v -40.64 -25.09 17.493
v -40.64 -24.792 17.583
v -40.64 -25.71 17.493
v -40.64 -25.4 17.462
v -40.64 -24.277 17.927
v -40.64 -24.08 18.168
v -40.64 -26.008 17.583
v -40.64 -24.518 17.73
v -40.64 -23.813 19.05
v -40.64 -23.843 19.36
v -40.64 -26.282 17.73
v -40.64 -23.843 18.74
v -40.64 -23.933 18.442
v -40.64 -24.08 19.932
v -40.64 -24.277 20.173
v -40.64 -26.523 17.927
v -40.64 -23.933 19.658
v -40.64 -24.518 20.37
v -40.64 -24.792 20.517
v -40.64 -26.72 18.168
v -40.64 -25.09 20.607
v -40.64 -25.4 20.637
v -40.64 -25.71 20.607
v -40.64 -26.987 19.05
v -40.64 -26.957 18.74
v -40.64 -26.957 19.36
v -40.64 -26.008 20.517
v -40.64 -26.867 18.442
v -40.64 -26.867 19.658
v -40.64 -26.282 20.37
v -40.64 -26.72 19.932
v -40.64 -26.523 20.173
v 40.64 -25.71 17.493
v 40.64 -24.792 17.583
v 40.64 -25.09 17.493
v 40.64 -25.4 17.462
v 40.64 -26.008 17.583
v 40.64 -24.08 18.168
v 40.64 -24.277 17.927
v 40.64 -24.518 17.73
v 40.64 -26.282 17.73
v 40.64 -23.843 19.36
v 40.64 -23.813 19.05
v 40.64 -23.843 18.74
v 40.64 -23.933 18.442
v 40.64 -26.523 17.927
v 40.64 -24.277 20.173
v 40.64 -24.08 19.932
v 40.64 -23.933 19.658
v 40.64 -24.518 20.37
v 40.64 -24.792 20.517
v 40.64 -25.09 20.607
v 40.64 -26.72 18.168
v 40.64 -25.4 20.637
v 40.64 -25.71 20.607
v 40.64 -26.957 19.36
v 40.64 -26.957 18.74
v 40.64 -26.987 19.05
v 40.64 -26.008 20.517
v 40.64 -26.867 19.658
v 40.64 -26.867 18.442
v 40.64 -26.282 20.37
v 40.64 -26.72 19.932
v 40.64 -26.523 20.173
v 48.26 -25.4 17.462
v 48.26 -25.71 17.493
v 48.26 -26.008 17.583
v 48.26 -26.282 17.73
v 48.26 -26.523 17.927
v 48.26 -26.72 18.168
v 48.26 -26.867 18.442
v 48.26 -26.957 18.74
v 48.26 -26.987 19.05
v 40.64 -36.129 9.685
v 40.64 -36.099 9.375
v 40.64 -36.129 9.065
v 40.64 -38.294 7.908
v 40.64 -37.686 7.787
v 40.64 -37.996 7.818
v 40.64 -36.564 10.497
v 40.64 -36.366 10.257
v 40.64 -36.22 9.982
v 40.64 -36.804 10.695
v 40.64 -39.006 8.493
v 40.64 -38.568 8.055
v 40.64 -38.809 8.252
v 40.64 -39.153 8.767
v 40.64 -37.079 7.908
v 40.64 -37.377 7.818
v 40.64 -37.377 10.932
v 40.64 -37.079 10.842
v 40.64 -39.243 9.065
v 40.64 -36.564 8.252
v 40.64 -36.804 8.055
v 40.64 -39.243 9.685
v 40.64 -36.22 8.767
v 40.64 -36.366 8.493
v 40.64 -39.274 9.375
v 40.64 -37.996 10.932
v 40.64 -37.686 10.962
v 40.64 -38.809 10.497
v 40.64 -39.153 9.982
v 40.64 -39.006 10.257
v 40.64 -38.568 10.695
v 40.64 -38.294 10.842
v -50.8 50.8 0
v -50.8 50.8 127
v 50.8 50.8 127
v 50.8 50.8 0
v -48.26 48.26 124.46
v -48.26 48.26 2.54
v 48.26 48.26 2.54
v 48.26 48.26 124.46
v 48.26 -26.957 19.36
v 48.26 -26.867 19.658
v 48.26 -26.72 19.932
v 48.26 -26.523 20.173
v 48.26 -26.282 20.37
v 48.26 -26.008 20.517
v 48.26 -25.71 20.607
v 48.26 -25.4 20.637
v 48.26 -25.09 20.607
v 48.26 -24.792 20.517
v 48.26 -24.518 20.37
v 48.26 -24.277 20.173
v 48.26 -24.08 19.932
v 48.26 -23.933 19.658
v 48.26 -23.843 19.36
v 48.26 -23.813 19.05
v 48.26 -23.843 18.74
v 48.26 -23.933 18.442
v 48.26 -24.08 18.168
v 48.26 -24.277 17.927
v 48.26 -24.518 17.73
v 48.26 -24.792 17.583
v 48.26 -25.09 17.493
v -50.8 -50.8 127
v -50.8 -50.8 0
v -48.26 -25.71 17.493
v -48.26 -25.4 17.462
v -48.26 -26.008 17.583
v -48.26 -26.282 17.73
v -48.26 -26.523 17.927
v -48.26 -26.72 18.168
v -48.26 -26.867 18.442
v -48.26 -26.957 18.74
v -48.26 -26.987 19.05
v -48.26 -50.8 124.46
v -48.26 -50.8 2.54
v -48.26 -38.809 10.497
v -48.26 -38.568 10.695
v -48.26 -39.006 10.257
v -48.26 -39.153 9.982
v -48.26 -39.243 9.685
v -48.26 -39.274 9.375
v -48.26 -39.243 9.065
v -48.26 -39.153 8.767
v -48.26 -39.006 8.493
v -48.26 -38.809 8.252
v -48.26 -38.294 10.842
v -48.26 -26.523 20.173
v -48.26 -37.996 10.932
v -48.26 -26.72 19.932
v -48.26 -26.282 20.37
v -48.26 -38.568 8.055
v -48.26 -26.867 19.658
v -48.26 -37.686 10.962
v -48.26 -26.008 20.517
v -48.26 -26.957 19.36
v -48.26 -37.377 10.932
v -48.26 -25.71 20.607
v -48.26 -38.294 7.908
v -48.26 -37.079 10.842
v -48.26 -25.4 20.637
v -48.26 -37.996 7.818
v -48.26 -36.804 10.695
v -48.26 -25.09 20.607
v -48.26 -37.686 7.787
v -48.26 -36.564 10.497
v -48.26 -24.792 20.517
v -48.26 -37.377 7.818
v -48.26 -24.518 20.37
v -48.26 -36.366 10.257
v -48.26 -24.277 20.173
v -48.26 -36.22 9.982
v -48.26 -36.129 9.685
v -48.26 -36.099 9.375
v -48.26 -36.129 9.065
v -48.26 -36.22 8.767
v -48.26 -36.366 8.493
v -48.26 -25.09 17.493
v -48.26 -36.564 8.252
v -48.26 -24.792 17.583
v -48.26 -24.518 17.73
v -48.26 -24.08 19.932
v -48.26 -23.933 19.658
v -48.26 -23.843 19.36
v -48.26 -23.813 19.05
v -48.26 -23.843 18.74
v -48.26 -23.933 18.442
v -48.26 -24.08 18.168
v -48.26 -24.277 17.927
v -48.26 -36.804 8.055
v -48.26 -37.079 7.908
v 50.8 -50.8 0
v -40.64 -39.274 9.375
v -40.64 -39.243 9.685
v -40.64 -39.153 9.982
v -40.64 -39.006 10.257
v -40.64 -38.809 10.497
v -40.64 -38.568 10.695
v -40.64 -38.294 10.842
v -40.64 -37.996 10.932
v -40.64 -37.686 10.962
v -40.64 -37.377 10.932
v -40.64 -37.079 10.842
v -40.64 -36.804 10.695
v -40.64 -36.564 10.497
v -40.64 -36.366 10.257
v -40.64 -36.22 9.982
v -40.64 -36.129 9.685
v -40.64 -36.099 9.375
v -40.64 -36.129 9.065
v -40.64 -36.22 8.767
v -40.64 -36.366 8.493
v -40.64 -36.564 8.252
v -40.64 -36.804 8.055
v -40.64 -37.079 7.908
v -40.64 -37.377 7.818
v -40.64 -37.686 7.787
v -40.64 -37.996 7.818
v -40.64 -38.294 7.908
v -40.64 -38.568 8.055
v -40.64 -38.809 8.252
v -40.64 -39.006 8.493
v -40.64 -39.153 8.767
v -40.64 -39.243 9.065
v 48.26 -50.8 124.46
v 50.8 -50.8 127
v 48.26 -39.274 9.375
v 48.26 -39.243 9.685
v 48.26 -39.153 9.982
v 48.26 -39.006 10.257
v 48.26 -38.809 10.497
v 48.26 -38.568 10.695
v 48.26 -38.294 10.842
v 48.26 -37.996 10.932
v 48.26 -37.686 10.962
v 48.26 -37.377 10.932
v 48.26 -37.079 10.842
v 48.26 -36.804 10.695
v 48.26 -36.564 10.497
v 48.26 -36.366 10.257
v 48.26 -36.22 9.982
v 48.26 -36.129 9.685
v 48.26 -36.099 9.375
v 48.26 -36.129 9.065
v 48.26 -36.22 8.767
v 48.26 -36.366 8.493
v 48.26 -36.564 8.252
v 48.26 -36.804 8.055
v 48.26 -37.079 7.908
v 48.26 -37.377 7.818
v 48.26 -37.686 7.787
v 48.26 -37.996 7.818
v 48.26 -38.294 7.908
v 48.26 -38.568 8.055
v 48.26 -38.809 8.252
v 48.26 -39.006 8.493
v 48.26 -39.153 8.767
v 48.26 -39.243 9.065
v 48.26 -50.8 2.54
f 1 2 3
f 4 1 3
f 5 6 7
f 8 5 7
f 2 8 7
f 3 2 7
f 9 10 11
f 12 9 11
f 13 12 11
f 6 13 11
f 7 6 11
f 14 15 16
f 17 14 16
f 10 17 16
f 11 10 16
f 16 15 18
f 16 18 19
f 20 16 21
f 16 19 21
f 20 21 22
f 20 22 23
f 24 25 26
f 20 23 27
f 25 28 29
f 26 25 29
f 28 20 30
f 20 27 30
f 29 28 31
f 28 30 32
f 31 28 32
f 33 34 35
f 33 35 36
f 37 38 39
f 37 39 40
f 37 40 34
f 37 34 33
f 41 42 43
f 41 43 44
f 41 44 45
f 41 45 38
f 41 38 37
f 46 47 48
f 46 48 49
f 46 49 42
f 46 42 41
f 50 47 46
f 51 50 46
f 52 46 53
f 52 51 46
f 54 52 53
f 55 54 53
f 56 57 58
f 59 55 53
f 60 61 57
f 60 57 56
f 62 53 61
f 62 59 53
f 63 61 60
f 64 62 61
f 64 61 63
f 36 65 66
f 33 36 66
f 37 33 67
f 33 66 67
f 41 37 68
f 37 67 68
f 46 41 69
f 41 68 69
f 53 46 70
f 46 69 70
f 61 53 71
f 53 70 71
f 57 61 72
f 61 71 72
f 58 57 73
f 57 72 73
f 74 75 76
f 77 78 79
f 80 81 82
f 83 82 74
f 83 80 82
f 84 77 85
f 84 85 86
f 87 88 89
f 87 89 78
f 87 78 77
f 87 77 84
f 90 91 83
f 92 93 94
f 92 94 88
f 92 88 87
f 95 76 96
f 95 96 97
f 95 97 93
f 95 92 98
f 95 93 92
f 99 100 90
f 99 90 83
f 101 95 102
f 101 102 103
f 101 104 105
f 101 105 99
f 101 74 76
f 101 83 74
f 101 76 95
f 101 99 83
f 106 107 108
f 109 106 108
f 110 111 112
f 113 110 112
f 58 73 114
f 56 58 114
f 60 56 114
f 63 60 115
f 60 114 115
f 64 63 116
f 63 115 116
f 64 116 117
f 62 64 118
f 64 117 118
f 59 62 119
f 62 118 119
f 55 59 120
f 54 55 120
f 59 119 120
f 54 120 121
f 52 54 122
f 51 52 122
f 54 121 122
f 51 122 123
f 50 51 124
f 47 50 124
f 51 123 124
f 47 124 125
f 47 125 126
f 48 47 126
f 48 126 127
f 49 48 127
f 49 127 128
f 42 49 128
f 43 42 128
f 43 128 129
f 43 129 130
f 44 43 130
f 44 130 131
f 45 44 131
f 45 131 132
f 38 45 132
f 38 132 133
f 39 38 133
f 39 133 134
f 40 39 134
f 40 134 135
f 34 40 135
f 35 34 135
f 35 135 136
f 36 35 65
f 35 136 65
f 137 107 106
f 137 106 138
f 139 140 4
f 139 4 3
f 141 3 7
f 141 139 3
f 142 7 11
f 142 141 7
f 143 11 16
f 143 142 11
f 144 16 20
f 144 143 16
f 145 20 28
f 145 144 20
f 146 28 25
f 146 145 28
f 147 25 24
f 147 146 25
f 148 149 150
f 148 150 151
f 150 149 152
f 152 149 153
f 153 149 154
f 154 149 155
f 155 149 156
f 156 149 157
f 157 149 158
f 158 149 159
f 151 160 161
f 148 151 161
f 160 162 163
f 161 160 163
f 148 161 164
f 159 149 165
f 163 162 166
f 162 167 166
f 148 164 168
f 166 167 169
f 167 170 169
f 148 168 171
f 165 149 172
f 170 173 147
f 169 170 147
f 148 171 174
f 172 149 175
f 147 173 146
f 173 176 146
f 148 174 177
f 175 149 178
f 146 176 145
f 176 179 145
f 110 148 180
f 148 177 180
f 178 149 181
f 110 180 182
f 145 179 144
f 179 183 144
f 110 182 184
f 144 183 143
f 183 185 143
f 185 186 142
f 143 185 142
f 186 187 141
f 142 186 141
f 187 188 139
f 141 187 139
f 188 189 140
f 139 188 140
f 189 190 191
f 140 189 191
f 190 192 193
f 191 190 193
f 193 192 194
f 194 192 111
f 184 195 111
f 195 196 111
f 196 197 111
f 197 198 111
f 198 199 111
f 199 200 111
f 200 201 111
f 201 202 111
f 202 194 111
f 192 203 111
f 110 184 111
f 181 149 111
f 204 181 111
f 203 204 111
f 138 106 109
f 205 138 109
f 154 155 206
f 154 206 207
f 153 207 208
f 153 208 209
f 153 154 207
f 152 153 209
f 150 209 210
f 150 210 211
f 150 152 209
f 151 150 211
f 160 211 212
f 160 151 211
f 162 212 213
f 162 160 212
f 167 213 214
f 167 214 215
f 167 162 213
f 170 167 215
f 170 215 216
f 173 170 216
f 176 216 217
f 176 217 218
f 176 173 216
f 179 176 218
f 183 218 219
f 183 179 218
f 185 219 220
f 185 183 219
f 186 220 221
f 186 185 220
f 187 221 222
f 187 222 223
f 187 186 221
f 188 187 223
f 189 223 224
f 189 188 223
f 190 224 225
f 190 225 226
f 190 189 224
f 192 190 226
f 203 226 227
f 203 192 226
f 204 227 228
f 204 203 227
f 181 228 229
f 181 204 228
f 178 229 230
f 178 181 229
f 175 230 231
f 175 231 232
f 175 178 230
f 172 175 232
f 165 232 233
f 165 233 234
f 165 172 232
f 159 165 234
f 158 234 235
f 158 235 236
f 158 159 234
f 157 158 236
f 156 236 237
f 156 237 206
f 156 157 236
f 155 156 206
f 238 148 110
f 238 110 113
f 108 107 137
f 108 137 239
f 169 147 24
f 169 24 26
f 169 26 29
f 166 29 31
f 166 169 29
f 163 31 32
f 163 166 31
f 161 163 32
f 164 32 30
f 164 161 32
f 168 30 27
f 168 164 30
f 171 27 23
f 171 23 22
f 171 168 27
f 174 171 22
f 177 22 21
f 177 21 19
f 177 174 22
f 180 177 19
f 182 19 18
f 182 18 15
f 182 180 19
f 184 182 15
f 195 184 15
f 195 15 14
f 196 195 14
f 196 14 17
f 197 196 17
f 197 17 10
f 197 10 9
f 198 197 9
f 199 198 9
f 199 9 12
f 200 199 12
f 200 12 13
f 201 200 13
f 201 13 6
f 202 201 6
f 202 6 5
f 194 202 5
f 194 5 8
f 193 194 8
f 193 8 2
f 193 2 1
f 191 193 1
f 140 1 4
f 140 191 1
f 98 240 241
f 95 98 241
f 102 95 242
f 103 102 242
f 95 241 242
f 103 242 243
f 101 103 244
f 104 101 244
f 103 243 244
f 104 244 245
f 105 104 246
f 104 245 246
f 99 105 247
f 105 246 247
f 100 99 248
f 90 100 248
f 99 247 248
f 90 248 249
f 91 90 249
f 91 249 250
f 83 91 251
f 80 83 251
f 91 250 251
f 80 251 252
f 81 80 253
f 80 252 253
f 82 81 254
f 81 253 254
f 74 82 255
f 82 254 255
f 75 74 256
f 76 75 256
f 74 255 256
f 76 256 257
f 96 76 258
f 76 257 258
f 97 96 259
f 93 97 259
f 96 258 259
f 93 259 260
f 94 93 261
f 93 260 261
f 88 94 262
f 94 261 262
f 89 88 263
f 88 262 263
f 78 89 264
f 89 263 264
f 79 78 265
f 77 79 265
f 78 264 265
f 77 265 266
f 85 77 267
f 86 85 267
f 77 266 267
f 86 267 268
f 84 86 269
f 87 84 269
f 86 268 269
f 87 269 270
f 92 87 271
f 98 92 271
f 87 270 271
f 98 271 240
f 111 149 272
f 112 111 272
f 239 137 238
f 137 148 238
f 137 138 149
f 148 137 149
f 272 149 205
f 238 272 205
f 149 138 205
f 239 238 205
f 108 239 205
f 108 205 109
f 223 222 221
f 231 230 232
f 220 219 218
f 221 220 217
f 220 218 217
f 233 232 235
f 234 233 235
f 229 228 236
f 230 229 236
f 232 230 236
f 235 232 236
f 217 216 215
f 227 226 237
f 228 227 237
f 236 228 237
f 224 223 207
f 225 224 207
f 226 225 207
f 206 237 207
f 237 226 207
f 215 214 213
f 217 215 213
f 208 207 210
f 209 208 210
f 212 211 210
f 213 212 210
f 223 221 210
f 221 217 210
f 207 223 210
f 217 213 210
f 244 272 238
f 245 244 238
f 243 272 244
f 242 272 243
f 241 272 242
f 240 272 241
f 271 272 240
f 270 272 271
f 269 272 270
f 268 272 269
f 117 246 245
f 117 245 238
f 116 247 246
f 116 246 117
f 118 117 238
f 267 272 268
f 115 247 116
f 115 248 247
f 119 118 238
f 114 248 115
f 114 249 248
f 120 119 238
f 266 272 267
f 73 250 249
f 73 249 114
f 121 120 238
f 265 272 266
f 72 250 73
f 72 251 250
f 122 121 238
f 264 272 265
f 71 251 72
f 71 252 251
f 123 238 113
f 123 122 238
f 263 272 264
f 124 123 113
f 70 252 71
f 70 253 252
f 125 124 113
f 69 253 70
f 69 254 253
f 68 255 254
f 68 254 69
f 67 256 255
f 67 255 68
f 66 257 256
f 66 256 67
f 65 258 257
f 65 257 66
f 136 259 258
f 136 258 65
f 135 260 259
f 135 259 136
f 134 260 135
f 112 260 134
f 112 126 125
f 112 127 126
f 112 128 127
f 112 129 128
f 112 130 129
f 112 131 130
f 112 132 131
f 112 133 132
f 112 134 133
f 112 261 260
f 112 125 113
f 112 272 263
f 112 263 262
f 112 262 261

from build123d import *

# Parameters (mm, degrees)
F0_W      = 101.6
F0_H      = 101.6
F1_DEPTH  = 127
F2_T      = -2.54
F4_R      = 1.5875
F5_DEPTH  = 7.62
F11_DEPTH = 10.16


with BuildPart() as f1:
    # F0 (on Top) → F1 (new body)
    with BuildSketch(Plane.XY):
        Rectangle(F0_W, F0_H)
    extrude(amount=F1_DEPTH)

    # F2
    f2_openings = [f1.faces().sort_by_distance(p)[0] for p in [
        (0, -50.8, 63.5),
    ]]
    offset(amount=F2_T, openings=f2_openings)

    # F4 (on face) → F5 (join)
    with BuildSketch(Plane(origin=(48.26, 0, 0), x_dir=(0, -1, 0), z_dir=(-1, 0, 0))):
        with Locations((37.686419, 9.374908)):
            Circle(F4_R)
    extrude(amount=F5_DEPTH)

    # F7: F1 across plane


with BuildPart() as f1_1:
    add(f1.part)
    add(f1.part.mirror(Plane.YZ))

    # F8: F1 across plane


with BuildPart() as f1_2:
    add(f1_1.part)
    add(f1_1.part.mirror(Plane.YZ))

    # F10 (on face) → F11 (join)
    with BuildSketch(Plane(origin=(-50.8, 0, 0), x_dir=(0, -1, 0), z_dir=(-1, 0, 0))):
        with BuildLine():
            ThreePointArc((25.4, 17.4625), (26.522532, 17.927468), (26.9875, 19.05))
            ThreePointArc((26.9875, 19.05), (24.277468, 20.172532), (25.4, 17.4625))
        make_face()
    extrude(amount=-F11_DEPTH)

    # F12: F1 across plane


with BuildPart() as f1_3:
    add(f1_2.part)
    add(f1_2.part.mirror(Plane.YZ))


solid = f1_3.part
